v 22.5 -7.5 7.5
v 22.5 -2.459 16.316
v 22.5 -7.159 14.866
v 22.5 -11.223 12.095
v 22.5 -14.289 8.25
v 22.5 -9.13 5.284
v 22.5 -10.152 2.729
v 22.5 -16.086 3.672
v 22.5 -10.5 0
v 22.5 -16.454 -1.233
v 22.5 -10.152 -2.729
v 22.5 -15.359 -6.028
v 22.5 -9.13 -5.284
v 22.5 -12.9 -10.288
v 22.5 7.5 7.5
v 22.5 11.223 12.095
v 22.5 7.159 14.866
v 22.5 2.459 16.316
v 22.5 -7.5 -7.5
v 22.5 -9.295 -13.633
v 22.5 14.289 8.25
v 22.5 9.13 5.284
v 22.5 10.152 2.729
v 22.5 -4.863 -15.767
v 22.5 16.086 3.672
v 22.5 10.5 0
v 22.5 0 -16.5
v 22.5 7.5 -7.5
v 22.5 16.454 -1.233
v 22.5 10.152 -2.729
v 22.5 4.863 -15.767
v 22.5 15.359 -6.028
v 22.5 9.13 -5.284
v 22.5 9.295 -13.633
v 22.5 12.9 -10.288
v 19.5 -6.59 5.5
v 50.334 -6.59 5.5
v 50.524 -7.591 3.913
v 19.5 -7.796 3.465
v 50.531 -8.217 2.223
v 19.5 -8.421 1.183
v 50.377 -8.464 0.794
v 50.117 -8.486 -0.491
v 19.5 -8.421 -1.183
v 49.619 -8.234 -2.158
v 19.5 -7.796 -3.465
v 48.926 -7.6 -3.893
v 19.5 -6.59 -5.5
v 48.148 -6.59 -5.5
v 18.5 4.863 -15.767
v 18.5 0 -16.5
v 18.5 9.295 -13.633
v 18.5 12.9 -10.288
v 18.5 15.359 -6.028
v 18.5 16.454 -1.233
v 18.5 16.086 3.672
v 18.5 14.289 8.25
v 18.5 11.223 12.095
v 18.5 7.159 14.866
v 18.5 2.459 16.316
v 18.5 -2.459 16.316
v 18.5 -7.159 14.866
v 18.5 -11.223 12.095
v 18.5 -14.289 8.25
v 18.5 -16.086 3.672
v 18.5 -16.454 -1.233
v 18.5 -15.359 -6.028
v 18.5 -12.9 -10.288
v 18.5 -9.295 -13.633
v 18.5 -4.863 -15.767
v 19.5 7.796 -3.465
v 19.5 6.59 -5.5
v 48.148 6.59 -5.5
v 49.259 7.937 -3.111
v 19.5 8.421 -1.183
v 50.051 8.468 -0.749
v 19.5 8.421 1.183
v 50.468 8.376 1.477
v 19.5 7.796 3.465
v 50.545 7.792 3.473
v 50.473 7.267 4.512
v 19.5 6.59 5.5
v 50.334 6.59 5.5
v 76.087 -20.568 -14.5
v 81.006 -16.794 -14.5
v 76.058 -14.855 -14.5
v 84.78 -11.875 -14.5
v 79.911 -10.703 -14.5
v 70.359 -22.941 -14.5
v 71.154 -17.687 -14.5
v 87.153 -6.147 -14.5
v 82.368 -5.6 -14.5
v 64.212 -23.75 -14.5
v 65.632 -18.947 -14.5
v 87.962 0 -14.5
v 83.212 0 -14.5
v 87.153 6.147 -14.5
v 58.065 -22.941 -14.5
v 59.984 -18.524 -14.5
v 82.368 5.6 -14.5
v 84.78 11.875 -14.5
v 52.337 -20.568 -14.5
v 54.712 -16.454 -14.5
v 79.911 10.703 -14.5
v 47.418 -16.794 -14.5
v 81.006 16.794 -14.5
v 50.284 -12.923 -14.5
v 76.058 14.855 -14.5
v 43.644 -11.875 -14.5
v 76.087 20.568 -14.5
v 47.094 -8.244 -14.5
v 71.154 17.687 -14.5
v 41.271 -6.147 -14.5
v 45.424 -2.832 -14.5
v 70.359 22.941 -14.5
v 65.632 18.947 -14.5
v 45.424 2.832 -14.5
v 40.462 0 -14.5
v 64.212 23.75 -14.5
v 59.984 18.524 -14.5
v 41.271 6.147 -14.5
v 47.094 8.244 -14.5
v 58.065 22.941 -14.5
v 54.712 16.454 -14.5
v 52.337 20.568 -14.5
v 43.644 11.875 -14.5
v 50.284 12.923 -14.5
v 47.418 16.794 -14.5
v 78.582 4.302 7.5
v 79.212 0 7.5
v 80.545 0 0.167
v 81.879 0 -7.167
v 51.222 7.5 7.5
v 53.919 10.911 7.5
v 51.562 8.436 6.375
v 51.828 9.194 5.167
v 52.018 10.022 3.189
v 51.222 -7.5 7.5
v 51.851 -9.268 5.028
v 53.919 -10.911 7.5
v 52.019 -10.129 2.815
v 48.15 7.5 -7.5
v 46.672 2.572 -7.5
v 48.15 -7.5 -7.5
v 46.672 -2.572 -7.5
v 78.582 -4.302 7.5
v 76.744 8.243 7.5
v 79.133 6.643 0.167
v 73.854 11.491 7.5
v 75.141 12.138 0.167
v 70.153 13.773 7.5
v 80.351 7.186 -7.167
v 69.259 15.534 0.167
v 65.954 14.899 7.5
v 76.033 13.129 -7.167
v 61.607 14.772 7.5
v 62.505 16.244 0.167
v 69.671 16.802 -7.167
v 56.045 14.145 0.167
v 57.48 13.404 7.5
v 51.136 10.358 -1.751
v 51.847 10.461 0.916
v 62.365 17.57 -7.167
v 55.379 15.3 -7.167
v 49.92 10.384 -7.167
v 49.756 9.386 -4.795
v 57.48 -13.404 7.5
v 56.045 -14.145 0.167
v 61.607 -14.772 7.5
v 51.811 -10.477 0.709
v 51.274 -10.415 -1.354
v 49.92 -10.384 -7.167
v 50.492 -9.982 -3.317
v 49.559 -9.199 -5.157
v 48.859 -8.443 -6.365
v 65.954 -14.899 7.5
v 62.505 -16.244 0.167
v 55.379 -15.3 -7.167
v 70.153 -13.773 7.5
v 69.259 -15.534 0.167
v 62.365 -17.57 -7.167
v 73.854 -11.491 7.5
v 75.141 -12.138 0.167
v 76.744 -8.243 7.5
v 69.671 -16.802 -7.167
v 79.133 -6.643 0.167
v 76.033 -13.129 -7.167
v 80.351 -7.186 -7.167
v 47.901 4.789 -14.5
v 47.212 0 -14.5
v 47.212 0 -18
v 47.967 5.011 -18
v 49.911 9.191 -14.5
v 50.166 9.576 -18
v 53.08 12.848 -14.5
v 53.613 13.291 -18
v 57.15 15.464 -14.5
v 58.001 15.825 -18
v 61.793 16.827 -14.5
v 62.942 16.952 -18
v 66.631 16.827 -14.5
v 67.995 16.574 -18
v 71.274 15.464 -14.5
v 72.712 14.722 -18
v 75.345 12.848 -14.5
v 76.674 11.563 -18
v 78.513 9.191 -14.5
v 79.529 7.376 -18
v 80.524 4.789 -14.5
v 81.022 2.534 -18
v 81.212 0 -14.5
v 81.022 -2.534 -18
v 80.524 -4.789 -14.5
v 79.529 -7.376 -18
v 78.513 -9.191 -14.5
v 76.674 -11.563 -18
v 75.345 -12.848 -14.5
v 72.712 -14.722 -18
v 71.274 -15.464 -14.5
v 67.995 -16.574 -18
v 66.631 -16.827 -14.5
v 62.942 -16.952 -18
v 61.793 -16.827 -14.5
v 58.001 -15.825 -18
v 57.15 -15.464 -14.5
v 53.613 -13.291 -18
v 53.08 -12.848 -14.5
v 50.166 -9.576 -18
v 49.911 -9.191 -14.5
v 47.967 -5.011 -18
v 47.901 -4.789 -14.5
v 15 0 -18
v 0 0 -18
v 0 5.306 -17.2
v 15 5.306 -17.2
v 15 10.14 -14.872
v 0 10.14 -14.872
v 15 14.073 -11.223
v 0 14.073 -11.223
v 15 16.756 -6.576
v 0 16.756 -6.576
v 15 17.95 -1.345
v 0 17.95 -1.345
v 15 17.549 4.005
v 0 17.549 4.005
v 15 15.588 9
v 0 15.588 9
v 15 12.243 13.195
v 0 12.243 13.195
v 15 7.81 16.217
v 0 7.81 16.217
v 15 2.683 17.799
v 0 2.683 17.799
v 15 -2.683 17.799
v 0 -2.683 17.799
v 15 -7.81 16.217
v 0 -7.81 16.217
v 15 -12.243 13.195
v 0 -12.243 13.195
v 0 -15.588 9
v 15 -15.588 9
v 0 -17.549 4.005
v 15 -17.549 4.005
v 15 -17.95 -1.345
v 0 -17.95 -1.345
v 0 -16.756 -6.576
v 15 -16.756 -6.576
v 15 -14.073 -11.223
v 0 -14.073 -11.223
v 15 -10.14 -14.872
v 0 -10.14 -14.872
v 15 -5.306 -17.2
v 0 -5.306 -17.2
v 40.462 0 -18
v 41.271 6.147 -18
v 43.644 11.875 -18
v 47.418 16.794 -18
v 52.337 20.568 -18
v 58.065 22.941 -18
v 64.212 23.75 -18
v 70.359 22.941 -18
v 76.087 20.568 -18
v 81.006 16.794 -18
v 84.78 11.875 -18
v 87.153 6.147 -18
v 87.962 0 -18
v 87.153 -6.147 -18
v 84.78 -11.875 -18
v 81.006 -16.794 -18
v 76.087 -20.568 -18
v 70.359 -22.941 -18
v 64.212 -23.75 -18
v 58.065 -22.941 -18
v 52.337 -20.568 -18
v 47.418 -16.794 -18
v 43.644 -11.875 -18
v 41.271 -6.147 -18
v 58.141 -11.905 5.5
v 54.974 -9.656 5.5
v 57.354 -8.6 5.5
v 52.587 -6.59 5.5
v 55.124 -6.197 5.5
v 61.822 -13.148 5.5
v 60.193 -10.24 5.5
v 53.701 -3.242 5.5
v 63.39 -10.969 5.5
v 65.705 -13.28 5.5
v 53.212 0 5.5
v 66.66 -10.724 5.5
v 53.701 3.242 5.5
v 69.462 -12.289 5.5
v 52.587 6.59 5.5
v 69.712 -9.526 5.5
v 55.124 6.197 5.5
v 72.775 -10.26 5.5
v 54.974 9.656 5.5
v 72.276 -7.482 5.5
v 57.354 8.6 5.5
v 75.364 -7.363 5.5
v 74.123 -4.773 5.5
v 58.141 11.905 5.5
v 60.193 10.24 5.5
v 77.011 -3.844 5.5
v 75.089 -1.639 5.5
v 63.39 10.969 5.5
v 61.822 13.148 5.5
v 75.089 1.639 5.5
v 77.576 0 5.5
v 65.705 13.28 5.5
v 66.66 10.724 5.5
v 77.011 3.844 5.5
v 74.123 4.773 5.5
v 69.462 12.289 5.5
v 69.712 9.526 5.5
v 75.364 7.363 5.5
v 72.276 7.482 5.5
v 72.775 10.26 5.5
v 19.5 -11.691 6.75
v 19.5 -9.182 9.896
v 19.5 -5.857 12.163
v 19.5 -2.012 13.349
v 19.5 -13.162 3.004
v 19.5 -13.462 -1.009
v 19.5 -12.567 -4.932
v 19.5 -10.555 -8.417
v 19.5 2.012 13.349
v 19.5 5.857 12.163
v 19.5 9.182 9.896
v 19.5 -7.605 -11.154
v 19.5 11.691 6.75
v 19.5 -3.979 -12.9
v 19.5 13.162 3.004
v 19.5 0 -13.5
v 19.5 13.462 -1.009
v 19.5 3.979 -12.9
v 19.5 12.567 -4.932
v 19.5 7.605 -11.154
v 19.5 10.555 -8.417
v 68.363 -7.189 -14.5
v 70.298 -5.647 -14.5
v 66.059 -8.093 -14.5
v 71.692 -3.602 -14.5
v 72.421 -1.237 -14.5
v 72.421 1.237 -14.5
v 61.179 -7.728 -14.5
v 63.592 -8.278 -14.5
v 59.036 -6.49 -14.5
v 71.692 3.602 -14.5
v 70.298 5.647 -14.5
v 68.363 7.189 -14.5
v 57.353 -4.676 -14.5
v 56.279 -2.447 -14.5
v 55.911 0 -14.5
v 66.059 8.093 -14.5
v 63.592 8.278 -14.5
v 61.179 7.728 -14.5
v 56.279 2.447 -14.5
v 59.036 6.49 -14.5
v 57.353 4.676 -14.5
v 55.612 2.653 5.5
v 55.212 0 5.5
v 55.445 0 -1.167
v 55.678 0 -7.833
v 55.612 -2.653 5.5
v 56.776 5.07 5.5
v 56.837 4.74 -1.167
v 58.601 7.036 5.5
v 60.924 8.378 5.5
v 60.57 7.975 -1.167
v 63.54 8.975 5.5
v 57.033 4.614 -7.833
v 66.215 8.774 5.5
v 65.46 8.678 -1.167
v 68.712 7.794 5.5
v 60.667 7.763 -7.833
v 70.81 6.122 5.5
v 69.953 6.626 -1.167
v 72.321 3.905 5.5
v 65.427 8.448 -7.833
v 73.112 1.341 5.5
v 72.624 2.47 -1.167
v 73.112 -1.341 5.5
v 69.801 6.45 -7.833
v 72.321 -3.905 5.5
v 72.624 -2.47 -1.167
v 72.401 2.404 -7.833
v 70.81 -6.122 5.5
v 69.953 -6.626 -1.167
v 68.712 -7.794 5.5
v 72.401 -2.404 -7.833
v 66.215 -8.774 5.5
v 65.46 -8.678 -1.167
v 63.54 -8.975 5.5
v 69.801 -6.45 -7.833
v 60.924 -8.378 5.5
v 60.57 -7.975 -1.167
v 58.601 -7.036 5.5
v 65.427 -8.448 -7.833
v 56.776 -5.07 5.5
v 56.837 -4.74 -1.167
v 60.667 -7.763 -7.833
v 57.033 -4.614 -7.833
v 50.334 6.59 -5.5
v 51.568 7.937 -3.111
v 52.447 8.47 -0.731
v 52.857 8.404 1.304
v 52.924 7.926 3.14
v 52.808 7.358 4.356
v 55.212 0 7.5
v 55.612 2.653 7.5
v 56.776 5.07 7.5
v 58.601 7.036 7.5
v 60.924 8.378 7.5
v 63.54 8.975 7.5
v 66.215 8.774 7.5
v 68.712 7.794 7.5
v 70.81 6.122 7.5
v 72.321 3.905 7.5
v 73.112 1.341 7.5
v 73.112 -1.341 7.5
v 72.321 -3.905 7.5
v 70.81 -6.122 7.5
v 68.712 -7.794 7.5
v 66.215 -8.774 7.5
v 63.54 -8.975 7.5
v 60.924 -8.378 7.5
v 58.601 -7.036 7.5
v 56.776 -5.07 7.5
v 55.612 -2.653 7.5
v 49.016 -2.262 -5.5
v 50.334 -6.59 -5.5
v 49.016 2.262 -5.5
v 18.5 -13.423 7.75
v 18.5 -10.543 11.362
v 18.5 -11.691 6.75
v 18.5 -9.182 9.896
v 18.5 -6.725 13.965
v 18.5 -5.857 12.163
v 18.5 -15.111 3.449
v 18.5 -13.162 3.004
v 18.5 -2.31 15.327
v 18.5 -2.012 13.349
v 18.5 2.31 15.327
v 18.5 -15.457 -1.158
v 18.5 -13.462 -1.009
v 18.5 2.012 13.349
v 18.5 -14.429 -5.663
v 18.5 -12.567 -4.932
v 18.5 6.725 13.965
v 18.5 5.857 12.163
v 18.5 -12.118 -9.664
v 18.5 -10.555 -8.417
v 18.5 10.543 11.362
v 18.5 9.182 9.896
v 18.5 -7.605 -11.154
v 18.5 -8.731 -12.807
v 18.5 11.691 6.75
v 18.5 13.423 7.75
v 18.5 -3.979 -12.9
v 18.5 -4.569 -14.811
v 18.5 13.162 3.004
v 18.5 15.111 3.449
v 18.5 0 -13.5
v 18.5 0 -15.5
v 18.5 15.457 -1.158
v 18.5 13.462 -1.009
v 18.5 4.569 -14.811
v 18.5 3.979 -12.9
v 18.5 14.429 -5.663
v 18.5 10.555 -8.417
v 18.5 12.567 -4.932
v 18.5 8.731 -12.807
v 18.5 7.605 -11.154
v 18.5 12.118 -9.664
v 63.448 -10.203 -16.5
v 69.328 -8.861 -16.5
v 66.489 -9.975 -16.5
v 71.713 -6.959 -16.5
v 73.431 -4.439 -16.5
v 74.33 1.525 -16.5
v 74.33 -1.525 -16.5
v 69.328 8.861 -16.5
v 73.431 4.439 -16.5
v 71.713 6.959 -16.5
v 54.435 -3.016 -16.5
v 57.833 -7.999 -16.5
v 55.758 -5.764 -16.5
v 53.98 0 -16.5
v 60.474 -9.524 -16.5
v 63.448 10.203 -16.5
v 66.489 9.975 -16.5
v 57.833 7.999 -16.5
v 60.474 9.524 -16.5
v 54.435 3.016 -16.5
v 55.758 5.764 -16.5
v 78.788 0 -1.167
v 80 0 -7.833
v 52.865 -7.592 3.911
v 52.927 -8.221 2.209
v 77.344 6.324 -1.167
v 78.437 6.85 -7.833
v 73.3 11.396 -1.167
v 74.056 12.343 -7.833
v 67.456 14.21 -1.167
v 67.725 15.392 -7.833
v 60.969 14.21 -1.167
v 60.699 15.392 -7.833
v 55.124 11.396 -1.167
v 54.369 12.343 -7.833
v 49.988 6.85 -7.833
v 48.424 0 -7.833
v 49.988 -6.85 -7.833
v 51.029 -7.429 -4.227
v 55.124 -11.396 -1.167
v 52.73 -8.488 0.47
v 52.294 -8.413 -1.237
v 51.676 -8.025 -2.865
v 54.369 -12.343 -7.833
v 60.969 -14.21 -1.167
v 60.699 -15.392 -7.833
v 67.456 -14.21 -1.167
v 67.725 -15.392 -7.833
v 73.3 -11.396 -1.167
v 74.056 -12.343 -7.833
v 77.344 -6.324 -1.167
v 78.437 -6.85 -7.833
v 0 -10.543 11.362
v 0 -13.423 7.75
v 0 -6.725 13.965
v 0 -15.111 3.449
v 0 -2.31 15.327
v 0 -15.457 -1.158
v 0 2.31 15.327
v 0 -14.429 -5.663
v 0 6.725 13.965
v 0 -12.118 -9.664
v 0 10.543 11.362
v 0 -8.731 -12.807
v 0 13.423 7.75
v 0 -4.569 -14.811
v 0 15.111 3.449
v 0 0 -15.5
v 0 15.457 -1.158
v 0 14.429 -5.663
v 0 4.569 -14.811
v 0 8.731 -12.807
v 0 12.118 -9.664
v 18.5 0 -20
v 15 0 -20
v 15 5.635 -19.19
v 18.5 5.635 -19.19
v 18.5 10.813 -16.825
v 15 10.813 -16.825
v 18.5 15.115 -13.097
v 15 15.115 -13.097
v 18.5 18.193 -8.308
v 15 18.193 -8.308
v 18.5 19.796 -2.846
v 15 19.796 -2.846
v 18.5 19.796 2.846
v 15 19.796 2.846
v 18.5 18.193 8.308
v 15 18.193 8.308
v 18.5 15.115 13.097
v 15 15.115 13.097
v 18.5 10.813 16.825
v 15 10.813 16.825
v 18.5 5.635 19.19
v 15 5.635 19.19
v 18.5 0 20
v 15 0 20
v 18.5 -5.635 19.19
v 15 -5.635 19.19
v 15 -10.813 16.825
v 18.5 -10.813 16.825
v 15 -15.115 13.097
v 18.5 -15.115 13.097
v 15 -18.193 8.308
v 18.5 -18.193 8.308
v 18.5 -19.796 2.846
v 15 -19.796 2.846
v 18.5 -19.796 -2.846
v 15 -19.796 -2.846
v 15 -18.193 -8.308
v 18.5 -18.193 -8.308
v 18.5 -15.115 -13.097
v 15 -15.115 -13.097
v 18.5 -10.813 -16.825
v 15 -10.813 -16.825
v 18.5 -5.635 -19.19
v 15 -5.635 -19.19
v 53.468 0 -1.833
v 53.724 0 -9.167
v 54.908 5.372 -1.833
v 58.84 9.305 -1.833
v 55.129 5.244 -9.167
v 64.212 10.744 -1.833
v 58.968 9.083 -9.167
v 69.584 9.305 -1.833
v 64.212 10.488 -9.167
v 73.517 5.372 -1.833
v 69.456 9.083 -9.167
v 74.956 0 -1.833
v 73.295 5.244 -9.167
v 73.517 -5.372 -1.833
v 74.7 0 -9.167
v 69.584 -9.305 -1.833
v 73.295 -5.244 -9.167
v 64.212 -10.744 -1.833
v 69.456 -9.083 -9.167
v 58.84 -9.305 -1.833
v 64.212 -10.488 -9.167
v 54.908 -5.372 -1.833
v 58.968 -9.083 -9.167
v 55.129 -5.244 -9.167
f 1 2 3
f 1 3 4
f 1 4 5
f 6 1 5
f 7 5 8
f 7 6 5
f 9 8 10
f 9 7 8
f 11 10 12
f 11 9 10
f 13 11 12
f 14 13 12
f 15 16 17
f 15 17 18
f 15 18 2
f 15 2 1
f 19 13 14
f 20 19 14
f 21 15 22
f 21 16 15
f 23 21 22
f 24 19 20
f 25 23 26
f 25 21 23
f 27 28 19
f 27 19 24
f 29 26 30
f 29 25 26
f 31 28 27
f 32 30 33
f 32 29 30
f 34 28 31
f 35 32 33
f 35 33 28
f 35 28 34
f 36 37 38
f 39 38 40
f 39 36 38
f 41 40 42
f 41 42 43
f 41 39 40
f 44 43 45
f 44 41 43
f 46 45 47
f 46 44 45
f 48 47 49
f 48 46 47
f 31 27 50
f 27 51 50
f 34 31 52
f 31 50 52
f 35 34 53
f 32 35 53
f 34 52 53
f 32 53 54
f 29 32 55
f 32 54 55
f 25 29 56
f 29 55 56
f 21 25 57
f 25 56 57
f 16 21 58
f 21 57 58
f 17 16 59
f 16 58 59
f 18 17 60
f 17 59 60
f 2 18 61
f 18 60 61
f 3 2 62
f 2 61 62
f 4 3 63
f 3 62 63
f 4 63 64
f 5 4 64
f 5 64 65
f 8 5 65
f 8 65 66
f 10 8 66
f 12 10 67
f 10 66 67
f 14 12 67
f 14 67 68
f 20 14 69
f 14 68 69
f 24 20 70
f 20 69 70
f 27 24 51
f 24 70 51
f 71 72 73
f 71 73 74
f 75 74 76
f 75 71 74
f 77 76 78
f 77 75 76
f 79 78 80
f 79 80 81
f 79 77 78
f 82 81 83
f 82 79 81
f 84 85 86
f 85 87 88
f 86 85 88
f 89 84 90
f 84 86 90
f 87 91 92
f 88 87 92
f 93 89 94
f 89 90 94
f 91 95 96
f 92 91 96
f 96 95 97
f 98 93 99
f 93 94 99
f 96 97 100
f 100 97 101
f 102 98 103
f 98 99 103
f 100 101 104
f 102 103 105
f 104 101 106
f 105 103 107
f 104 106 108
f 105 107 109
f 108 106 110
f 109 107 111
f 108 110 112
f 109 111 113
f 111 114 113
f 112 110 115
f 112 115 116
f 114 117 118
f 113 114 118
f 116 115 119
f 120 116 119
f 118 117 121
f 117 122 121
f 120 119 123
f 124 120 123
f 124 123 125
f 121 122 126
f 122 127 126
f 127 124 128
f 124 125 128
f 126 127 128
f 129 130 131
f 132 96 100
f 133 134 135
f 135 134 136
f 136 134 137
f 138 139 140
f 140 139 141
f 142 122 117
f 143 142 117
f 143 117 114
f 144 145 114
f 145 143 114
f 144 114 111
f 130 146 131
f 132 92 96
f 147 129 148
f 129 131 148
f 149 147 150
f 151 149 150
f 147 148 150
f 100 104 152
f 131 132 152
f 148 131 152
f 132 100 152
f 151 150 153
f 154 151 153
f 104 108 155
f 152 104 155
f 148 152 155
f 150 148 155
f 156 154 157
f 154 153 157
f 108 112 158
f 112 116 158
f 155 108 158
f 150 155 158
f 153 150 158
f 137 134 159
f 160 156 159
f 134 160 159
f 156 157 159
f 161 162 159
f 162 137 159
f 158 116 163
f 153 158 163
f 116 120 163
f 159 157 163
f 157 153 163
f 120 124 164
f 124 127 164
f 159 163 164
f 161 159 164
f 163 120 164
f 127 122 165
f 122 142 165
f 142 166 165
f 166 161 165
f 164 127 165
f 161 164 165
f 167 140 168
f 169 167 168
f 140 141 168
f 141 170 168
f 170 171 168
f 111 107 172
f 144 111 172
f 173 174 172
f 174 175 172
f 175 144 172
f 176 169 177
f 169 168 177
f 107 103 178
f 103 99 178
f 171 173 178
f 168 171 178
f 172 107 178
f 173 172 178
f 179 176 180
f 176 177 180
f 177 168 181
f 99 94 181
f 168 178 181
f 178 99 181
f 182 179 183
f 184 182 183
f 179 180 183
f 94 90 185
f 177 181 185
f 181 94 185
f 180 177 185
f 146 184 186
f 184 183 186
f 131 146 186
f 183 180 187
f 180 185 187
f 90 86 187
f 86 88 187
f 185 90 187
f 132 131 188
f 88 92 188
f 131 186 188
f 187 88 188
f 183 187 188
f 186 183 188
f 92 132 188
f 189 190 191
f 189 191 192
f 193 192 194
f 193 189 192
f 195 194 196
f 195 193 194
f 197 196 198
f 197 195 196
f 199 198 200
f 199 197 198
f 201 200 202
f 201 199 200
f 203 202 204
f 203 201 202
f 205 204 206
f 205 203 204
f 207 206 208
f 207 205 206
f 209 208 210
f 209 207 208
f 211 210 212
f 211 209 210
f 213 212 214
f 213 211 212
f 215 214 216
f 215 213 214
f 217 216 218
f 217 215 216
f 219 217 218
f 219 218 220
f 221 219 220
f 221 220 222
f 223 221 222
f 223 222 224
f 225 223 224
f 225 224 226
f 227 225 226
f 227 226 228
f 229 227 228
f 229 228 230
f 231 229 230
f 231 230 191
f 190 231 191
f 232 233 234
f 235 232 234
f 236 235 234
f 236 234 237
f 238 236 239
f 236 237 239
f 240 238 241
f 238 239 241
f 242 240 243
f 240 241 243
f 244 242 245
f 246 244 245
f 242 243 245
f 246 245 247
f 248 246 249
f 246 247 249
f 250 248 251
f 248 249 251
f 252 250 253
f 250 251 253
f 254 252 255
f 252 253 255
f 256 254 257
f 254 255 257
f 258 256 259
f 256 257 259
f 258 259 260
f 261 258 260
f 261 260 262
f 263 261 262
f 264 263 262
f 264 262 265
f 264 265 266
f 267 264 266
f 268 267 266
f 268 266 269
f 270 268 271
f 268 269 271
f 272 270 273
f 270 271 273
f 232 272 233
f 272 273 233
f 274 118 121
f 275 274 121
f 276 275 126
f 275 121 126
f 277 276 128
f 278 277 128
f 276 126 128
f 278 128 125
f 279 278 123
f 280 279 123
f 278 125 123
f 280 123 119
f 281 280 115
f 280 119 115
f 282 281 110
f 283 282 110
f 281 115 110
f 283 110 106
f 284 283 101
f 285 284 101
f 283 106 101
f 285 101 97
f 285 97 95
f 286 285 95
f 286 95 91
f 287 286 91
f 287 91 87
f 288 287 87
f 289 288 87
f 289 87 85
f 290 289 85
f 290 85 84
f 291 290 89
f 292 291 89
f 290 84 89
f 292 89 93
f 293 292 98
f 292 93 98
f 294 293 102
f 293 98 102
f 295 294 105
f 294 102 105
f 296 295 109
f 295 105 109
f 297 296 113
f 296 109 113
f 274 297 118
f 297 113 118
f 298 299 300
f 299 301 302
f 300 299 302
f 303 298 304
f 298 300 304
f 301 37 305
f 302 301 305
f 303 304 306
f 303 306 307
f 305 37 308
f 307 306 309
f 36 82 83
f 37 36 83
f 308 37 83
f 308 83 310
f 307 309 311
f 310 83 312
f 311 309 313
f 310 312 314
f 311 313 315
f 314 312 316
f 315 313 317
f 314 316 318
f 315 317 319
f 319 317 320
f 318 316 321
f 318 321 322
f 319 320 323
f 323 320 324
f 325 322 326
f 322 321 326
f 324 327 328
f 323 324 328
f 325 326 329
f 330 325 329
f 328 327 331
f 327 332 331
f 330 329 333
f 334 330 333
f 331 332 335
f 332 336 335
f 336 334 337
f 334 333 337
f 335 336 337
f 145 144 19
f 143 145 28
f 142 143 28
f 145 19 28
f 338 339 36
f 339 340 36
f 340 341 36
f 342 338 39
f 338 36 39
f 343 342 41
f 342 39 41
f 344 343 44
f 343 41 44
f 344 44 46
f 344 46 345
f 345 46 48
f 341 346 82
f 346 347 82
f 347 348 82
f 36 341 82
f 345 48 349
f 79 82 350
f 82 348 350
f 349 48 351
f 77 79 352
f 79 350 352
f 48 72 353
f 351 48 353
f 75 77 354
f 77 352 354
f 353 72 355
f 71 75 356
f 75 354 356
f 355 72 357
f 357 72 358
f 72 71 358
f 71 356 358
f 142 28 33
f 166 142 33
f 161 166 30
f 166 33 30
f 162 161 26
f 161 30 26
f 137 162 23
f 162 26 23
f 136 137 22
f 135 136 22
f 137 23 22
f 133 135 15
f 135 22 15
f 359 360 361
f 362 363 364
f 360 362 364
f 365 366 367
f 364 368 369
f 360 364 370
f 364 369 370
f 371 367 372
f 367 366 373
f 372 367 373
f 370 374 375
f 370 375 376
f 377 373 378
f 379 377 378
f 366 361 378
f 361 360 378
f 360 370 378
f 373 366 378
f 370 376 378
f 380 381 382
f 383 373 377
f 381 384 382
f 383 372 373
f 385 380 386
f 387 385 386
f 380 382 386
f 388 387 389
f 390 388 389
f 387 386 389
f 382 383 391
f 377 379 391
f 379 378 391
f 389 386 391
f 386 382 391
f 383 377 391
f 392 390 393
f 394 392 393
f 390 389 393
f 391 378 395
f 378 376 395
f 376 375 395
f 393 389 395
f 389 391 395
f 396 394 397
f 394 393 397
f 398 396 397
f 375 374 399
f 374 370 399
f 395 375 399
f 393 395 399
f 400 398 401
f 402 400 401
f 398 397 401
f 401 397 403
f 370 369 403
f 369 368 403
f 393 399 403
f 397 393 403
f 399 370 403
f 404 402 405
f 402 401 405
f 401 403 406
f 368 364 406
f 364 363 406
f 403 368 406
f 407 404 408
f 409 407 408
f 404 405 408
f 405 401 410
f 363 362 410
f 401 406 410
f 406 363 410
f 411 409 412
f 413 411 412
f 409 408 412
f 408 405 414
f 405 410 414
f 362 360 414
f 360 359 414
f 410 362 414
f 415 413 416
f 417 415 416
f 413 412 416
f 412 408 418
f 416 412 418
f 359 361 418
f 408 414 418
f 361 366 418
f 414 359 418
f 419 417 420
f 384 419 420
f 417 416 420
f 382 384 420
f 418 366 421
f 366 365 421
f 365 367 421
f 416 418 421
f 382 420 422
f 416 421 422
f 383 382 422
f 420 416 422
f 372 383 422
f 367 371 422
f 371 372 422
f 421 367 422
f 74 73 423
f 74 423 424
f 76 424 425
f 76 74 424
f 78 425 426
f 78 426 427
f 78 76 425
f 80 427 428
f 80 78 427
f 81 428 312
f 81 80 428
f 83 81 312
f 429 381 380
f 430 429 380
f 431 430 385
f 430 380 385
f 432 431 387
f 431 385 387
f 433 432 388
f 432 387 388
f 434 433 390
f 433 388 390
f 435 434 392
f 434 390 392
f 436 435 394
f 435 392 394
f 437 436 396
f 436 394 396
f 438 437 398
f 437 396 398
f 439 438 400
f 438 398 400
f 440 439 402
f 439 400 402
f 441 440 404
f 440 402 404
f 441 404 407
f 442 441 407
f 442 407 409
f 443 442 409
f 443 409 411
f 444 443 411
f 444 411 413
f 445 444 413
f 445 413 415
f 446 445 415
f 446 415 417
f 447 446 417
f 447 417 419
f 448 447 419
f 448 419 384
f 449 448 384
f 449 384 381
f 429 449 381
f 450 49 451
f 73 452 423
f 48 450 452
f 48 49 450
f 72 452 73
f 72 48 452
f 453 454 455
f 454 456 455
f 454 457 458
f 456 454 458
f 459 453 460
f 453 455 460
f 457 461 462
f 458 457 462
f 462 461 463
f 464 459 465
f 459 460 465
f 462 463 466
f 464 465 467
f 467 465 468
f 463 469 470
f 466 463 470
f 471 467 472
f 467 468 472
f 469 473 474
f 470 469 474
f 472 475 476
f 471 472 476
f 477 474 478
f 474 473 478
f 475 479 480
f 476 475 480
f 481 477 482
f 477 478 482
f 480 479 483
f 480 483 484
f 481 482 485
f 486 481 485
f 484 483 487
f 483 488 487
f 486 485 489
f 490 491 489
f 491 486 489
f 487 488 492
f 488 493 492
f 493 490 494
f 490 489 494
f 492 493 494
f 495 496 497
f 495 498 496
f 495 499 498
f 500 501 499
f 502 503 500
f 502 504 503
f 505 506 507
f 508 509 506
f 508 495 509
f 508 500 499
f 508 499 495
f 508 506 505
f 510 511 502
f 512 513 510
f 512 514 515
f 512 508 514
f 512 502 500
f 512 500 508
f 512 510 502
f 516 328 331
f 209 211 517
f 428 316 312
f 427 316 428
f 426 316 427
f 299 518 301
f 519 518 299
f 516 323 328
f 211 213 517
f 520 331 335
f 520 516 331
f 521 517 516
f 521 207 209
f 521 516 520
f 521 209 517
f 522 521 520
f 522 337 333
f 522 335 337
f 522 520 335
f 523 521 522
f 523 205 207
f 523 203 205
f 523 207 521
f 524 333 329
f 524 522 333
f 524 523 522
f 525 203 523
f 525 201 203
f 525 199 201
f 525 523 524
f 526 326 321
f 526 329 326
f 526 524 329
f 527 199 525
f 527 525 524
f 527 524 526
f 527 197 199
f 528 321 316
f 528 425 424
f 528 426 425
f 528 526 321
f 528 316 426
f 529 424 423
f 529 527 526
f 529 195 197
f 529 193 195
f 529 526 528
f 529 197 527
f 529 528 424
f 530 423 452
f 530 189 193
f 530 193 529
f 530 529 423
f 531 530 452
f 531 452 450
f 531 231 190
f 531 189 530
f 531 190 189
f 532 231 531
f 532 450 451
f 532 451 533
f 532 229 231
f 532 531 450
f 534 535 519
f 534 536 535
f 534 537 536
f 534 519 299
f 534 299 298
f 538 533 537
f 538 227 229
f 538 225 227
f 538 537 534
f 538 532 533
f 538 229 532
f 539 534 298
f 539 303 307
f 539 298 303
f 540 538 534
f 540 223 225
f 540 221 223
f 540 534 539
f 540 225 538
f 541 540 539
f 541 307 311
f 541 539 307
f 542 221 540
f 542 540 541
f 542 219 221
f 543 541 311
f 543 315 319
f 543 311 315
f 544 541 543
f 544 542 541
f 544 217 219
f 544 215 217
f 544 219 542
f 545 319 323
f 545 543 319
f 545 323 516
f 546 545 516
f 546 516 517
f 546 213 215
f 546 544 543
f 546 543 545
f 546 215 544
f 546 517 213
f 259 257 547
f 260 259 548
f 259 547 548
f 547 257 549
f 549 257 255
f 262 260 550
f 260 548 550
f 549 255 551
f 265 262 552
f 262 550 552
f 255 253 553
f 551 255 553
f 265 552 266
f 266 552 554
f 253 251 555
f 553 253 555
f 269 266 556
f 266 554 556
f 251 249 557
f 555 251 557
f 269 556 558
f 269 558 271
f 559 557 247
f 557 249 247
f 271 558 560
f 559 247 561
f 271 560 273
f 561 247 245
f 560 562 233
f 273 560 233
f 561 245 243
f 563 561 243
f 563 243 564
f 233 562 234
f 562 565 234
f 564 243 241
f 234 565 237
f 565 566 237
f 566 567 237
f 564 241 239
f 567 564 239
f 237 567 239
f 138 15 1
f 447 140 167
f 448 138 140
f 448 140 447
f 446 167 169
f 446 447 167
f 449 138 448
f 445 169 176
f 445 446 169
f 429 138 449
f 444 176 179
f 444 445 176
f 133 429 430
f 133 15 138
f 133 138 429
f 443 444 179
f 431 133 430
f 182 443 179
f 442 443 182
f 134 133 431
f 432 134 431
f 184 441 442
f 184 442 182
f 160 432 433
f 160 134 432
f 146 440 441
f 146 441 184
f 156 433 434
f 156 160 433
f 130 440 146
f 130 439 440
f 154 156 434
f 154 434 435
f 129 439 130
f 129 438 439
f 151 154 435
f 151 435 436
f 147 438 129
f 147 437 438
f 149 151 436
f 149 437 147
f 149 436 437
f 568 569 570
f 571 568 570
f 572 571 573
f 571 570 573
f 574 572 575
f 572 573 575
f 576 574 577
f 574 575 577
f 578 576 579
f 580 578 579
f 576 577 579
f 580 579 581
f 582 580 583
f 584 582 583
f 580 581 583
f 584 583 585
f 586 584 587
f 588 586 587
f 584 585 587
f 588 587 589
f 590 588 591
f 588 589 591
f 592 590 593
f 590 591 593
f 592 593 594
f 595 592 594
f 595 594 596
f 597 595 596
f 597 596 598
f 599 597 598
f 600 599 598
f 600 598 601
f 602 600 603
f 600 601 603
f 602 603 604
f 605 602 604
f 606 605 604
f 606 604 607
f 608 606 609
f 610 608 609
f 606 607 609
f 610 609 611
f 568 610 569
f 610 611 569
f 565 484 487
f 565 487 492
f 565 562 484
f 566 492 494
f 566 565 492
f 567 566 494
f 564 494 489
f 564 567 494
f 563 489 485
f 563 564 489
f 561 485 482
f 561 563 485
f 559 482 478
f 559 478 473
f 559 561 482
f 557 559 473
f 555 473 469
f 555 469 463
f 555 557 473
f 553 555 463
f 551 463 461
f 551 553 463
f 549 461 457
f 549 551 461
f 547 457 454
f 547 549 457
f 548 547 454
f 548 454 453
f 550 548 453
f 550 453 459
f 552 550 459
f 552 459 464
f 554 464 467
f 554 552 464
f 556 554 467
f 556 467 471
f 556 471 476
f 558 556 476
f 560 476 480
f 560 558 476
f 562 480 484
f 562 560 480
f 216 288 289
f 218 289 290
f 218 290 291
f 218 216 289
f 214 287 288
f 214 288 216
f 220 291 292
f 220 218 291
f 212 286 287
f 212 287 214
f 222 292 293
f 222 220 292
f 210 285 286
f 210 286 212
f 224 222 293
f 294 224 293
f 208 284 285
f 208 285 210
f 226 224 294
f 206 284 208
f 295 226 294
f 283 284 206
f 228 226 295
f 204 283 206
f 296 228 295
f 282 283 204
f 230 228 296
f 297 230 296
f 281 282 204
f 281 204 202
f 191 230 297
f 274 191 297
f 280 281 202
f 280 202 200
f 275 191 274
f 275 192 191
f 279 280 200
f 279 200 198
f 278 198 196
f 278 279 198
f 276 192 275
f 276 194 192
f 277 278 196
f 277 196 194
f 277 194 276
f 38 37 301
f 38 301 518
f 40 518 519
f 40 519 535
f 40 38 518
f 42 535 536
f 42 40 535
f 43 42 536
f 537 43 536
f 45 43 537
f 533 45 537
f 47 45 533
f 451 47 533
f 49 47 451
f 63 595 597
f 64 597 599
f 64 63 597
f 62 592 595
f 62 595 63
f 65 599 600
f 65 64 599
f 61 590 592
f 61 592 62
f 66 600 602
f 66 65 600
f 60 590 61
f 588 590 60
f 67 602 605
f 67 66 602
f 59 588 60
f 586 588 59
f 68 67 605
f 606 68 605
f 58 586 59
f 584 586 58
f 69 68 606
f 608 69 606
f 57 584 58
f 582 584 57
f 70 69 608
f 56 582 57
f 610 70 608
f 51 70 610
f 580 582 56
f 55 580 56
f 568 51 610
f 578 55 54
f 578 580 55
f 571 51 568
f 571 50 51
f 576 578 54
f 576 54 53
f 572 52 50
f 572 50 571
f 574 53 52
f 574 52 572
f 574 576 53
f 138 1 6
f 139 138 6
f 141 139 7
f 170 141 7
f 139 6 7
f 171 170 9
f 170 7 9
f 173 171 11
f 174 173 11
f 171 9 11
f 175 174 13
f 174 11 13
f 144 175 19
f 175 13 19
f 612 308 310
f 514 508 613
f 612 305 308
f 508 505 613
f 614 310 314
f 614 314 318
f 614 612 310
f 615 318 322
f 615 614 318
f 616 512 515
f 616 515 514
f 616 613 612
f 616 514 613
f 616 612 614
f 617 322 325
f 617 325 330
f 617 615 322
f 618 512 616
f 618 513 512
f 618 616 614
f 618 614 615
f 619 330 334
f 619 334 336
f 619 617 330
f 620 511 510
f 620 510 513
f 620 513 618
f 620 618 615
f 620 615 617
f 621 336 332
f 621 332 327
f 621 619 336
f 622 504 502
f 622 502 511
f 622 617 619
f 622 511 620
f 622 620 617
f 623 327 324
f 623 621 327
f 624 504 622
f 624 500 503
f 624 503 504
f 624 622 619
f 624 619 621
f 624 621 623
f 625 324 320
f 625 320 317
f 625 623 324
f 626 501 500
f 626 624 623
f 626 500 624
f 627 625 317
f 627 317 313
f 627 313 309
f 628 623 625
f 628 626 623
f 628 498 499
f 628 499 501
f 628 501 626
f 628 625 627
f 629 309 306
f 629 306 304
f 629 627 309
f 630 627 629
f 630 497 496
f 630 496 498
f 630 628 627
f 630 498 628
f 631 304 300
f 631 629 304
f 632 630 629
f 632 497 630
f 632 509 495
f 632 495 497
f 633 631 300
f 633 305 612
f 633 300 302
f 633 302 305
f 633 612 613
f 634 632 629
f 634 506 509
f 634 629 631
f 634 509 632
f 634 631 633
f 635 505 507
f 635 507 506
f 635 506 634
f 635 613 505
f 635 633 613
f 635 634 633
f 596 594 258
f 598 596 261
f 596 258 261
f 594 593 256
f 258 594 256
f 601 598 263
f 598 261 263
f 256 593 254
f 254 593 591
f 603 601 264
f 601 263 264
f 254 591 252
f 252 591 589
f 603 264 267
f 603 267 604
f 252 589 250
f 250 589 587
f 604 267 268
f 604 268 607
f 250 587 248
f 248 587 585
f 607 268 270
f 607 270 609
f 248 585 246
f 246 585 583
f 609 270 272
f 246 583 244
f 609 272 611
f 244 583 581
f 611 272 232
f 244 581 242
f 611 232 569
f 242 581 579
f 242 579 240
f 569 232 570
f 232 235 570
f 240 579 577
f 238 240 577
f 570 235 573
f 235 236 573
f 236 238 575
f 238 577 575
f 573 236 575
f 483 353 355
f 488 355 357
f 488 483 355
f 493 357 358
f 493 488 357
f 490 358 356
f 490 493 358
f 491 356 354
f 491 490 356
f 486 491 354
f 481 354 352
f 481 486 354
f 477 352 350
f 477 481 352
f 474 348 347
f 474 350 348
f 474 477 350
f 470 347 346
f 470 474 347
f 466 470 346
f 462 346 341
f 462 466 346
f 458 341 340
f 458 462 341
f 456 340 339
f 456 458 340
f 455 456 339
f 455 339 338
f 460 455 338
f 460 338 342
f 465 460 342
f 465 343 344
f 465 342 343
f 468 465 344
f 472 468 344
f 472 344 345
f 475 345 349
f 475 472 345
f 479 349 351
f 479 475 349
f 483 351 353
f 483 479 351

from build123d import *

# Parameters (mm, degrees)
CROQUIS1_R                 = 18
CROQUIS1_R_2               = 15.5
SALIENTE_EXTRUIR1_DEPTH    = 15
CROQUIS2_R                 = 20
CROQUIS2_R_2               = 15.5
SALIENTE_EXTRUIR2_DEPTH    = 3.5
CROQUIS4_R                 = 16.5
CROQUIS4_R_2               = 13.5
SALIENTE_EXTRUIR3_DEPTH    = 4
CROQUIS5_R                 = 16.5
SALIENTE_EXTRUIR4_DEPTH    = 3
SALIENTE_EXTRUIR5_DEPTH    = 31
CROQUIS7_R                 = 15
CROQUIS8_R                 = 19
CROQUIS9_R                 = 13
CROQUIS10_R                = 17
CORTAR_EXTRUIR1_DEPTH      = 41
CORTAR_EXTRUIR1_DEPTH_BACK = 13
CROQUIS12_R                = 15
SALIENTE_EXTRUIR6_DEPTH    = 2
CROQUIS14_R                = 11
SALIENTE_EXTRUIR7_DEPTH    = 22
SALIENTE_EXTRUIR7_TAPER    = 2
CROQUIS17_R                = 9
CROQUIS15_R                = 8.231743071
CROQUIS18_R                = 9
CORTAR_EXTRUIR2_DEPTH      = 57
CROQUIS19_R                = 10.231743071
SALIENTE_EXTRUIR8_DEPTH    = 2
CROQUIS20_R                = 23.75
CROQUIS20_R_2              = 17
SALIENTE_EXTRUIR9_DEPTH    = 3.5


with BuildPart() as part:
    # Croquis1 → Saliente-Extruir1 (new body)
    with BuildSketch(Plane(origin=(0, 0, 0), x_dir=(0, 0, -1), z_dir=(1, 0, 0))):
        Circle(CROQUIS1_R)
        Circle(CROQUIS1_R_2, mode=Mode.SUBTRACT)
    extrude(amount=SALIENTE_EXTRUIR1_DEPTH)

    # Croquis2 → Saliente-Extruir2 (add)
    with BuildSketch(Plane(origin=(15, 0, 0), x_dir=(0, 0, -1), z_dir=(1, 0, 0))):
        Circle(CROQUIS2_R)
        Circle(CROQUIS2_R_2, mode=Mode.SUBTRACT)
    extrude(amount=SALIENTE_EXTRUIR2_DEPTH)

    # Croquis4 → Saliente-Extruir3 (add)
    with BuildSketch(Plane(origin=(18.5, 0, 0), x_dir=(0, 0, -1), z_dir=(1, 0, 0))):
        Circle(CROQUIS4_R)
        Circle(CROQUIS4_R_2, mode=Mode.SUBTRACT)
    extrude(amount=SALIENTE_EXTRUIR3_DEPTH)

    # Croquis5 → Saliente-Extruir4 (add)
    with BuildSketch(Plane(origin=(22.5, 0, 0), x_dir=(0, 0, -1), z_dir=(1, 0, 0))):
        Circle(CROQUIS5_R)
    extrude(amount=-SALIENTE_EXTRUIR4_DEPTH)

    # Croquis6 → Saliente-Extruir5 (add)
    with BuildSketch(Plane(origin=(22.5, 0, 0), x_dir=(0, 0, -1), z_dir=(1, 0, 0))):
        with BuildLine():
            Line((-7.5, 7.5), (-7.5, -7.5))
            ThreePointArc((-7.5, -7.5), (0, -10.5), (7.5, -7.5))
            Line((7.5, -7.5), (7.5, 7.5))
            ThreePointArc((7.5, 7.5), (0, 10.5), (-7.5, 7.5))
        make_face()
        with BuildLine():
            Line((-5.5, 6.590315858), (-5.5, -6.590315858))
            ThreePointArc((-5.5, -6.590315858), (0, -8.5), (5.5, -6.590315858))
            Line((5.5, -6.590315858), (5.5, 6.590315858))
            ThreePointArc((5.5, 6.590315858), (0, 8.5), (-5.5, 6.590315858))
        make_face(mode=Mode.SUBTRACT)
    extrude(amount=SALIENTE_EXTRUIR5_DEPTH)

    # Croquis7 → Recubrir1 section 0
    with BuildSketch(Plane.XY.offset(7.5)):
        with Locations((64.212142643, 0)):
            Circle(CROQUIS7_R)
    # Croquis8 → Recubrir1 section 1
    with BuildSketch(Plane.XY.offset(-14.5)):
        with Locations((64.212142643, 0)):
            Circle(CROQUIS8_R)
    loft()

    # Croquis9 → Cortar-Recubrir1 section 0
    with BuildSketch(Plane.XY.offset(7.5)):
        with Locations((64.212142643, 0)):
            Circle(CROQUIS9_R)
    # Croquis10 → Cortar-Recubrir1 section 1
    with BuildSketch(Plane(origin=(0, 0, -14.5), x_dir=(-1, 0, 0), z_dir=(0, 0, -1))):
        with Locations((-64.212142643, 0)):
            Circle(CROQUIS10_R)
    loft(mode=Mode.SUBTRACT)

    # Croquis11 → Cortar-Extruir1 (cut, two sides)
    with BuildSketch(Plane(origin=(22.5, 0, 0), x_dir=(0, 0, -1), z_dir=(1, 0, 0))) as cortar_extruir1_sk:
        with BuildLine():
            Line((-5.5, 6.590315858), (-5.5, -6.590315858))
            ThreePointArc((-5.5, -6.590315858), (0, -8.5), (5.5, -6.590315858))
            Line((5.5, -6.590315858), (5.5, 6.590315858))
            ThreePointArc((5.5, 6.590315858), (0, 8.5), (-5.5, 6.590315858))
        make_face()
    extrude(amount=CORTAR_EXTRUIR1_DEPTH, mode=Mode.SUBTRACT)
    extrude(cortar_extruir1_sk.sketch, amount=-CORTAR_EXTRUIR1_DEPTH_BACK, mode=Mode.SUBTRACT)

    # Croquis12 → Saliente-Extruir6 (add)
    with BuildSketch(Plane.XY.offset(7.5)):
        with Locations((64.212142643, 0)):
            Circle(CROQUIS12_R)
    extrude(amount=-SALIENTE_EXTRUIR6_DEPTH)

    # Croquis14 → Saliente-Extruir7 (add)
    with BuildSketch(Plane(origin=(0, 0, 5.5), x_dir=(-1, 0, 0), z_dir=(0, 0, -1))):
        with Locations((-64.212142643, 0)):
            Circle(CROQUIS14_R)
    extrude(amount=SALIENTE_EXTRUIR7_DEPTH, taper=SALIENTE_EXTRUIR7_TAPER)

    # Croquis17 → Cortar-Recubrir2 section 0
    with BuildSketch(Plane(origin=(0, 0, 5.5), x_dir=(-1, 0, 0), z_dir=(0, 0, -1))):
        with Locations((-64.212142643, 0)):
            Circle(CROQUIS17_R)
    # Croquis15 → Cortar-Recubrir2 section 1
    with BuildSketch(Plane(origin=(0, 0, -16.5), x_dir=(-1, 0, 0), z_dir=(0, 0, -1))):
        with Locations((-64.212142643, 0)):
            Circle(CROQUIS15_R)
    loft(mode=Mode.SUBTRACT)

    # Croquis18 → Cortar-Extruir2 (cut)
    with BuildSketch(Plane(origin=(0, 0, 5.5), x_dir=(-1, 0, 0), z_dir=(0, 0, -1))):
        with Locations((-64.212142643, 0)):
            Circle(CROQUIS18_R)
    extrude(amount=-CORTAR_EXTRUIR2_DEPTH, mode=Mode.SUBTRACT)

    # Croquis19 → Saliente-Extruir8 (add)
    with BuildSketch(Plane(origin=(0, 0, -16.5), x_dir=(-1, 0, 0), z_dir=(0, 0, -1))):
        with Locations((-64.212142643, 0)):
            Circle(CROQUIS19_R)
    extrude(amount=-SALIENTE_EXTRUIR8_DEPTH)

    # Croquis20 → Saliente-Extruir9 (add)
    with BuildSketch(Plane(origin=(0, 0, -14.5), x_dir=(-1, 0, 0), z_dir=(0, 0, -1))):
        with Locations((-64.212142643, 0)):
            Circle(CROQUIS20_R)
        with Locations((-64.212142643, 0)):
            Circle(CROQUIS20_R_2, mode=Mode.SUBTRACT)
    extrude(amount=SALIENTE_EXTRUIR9_DEPTH)


solid = part.part
